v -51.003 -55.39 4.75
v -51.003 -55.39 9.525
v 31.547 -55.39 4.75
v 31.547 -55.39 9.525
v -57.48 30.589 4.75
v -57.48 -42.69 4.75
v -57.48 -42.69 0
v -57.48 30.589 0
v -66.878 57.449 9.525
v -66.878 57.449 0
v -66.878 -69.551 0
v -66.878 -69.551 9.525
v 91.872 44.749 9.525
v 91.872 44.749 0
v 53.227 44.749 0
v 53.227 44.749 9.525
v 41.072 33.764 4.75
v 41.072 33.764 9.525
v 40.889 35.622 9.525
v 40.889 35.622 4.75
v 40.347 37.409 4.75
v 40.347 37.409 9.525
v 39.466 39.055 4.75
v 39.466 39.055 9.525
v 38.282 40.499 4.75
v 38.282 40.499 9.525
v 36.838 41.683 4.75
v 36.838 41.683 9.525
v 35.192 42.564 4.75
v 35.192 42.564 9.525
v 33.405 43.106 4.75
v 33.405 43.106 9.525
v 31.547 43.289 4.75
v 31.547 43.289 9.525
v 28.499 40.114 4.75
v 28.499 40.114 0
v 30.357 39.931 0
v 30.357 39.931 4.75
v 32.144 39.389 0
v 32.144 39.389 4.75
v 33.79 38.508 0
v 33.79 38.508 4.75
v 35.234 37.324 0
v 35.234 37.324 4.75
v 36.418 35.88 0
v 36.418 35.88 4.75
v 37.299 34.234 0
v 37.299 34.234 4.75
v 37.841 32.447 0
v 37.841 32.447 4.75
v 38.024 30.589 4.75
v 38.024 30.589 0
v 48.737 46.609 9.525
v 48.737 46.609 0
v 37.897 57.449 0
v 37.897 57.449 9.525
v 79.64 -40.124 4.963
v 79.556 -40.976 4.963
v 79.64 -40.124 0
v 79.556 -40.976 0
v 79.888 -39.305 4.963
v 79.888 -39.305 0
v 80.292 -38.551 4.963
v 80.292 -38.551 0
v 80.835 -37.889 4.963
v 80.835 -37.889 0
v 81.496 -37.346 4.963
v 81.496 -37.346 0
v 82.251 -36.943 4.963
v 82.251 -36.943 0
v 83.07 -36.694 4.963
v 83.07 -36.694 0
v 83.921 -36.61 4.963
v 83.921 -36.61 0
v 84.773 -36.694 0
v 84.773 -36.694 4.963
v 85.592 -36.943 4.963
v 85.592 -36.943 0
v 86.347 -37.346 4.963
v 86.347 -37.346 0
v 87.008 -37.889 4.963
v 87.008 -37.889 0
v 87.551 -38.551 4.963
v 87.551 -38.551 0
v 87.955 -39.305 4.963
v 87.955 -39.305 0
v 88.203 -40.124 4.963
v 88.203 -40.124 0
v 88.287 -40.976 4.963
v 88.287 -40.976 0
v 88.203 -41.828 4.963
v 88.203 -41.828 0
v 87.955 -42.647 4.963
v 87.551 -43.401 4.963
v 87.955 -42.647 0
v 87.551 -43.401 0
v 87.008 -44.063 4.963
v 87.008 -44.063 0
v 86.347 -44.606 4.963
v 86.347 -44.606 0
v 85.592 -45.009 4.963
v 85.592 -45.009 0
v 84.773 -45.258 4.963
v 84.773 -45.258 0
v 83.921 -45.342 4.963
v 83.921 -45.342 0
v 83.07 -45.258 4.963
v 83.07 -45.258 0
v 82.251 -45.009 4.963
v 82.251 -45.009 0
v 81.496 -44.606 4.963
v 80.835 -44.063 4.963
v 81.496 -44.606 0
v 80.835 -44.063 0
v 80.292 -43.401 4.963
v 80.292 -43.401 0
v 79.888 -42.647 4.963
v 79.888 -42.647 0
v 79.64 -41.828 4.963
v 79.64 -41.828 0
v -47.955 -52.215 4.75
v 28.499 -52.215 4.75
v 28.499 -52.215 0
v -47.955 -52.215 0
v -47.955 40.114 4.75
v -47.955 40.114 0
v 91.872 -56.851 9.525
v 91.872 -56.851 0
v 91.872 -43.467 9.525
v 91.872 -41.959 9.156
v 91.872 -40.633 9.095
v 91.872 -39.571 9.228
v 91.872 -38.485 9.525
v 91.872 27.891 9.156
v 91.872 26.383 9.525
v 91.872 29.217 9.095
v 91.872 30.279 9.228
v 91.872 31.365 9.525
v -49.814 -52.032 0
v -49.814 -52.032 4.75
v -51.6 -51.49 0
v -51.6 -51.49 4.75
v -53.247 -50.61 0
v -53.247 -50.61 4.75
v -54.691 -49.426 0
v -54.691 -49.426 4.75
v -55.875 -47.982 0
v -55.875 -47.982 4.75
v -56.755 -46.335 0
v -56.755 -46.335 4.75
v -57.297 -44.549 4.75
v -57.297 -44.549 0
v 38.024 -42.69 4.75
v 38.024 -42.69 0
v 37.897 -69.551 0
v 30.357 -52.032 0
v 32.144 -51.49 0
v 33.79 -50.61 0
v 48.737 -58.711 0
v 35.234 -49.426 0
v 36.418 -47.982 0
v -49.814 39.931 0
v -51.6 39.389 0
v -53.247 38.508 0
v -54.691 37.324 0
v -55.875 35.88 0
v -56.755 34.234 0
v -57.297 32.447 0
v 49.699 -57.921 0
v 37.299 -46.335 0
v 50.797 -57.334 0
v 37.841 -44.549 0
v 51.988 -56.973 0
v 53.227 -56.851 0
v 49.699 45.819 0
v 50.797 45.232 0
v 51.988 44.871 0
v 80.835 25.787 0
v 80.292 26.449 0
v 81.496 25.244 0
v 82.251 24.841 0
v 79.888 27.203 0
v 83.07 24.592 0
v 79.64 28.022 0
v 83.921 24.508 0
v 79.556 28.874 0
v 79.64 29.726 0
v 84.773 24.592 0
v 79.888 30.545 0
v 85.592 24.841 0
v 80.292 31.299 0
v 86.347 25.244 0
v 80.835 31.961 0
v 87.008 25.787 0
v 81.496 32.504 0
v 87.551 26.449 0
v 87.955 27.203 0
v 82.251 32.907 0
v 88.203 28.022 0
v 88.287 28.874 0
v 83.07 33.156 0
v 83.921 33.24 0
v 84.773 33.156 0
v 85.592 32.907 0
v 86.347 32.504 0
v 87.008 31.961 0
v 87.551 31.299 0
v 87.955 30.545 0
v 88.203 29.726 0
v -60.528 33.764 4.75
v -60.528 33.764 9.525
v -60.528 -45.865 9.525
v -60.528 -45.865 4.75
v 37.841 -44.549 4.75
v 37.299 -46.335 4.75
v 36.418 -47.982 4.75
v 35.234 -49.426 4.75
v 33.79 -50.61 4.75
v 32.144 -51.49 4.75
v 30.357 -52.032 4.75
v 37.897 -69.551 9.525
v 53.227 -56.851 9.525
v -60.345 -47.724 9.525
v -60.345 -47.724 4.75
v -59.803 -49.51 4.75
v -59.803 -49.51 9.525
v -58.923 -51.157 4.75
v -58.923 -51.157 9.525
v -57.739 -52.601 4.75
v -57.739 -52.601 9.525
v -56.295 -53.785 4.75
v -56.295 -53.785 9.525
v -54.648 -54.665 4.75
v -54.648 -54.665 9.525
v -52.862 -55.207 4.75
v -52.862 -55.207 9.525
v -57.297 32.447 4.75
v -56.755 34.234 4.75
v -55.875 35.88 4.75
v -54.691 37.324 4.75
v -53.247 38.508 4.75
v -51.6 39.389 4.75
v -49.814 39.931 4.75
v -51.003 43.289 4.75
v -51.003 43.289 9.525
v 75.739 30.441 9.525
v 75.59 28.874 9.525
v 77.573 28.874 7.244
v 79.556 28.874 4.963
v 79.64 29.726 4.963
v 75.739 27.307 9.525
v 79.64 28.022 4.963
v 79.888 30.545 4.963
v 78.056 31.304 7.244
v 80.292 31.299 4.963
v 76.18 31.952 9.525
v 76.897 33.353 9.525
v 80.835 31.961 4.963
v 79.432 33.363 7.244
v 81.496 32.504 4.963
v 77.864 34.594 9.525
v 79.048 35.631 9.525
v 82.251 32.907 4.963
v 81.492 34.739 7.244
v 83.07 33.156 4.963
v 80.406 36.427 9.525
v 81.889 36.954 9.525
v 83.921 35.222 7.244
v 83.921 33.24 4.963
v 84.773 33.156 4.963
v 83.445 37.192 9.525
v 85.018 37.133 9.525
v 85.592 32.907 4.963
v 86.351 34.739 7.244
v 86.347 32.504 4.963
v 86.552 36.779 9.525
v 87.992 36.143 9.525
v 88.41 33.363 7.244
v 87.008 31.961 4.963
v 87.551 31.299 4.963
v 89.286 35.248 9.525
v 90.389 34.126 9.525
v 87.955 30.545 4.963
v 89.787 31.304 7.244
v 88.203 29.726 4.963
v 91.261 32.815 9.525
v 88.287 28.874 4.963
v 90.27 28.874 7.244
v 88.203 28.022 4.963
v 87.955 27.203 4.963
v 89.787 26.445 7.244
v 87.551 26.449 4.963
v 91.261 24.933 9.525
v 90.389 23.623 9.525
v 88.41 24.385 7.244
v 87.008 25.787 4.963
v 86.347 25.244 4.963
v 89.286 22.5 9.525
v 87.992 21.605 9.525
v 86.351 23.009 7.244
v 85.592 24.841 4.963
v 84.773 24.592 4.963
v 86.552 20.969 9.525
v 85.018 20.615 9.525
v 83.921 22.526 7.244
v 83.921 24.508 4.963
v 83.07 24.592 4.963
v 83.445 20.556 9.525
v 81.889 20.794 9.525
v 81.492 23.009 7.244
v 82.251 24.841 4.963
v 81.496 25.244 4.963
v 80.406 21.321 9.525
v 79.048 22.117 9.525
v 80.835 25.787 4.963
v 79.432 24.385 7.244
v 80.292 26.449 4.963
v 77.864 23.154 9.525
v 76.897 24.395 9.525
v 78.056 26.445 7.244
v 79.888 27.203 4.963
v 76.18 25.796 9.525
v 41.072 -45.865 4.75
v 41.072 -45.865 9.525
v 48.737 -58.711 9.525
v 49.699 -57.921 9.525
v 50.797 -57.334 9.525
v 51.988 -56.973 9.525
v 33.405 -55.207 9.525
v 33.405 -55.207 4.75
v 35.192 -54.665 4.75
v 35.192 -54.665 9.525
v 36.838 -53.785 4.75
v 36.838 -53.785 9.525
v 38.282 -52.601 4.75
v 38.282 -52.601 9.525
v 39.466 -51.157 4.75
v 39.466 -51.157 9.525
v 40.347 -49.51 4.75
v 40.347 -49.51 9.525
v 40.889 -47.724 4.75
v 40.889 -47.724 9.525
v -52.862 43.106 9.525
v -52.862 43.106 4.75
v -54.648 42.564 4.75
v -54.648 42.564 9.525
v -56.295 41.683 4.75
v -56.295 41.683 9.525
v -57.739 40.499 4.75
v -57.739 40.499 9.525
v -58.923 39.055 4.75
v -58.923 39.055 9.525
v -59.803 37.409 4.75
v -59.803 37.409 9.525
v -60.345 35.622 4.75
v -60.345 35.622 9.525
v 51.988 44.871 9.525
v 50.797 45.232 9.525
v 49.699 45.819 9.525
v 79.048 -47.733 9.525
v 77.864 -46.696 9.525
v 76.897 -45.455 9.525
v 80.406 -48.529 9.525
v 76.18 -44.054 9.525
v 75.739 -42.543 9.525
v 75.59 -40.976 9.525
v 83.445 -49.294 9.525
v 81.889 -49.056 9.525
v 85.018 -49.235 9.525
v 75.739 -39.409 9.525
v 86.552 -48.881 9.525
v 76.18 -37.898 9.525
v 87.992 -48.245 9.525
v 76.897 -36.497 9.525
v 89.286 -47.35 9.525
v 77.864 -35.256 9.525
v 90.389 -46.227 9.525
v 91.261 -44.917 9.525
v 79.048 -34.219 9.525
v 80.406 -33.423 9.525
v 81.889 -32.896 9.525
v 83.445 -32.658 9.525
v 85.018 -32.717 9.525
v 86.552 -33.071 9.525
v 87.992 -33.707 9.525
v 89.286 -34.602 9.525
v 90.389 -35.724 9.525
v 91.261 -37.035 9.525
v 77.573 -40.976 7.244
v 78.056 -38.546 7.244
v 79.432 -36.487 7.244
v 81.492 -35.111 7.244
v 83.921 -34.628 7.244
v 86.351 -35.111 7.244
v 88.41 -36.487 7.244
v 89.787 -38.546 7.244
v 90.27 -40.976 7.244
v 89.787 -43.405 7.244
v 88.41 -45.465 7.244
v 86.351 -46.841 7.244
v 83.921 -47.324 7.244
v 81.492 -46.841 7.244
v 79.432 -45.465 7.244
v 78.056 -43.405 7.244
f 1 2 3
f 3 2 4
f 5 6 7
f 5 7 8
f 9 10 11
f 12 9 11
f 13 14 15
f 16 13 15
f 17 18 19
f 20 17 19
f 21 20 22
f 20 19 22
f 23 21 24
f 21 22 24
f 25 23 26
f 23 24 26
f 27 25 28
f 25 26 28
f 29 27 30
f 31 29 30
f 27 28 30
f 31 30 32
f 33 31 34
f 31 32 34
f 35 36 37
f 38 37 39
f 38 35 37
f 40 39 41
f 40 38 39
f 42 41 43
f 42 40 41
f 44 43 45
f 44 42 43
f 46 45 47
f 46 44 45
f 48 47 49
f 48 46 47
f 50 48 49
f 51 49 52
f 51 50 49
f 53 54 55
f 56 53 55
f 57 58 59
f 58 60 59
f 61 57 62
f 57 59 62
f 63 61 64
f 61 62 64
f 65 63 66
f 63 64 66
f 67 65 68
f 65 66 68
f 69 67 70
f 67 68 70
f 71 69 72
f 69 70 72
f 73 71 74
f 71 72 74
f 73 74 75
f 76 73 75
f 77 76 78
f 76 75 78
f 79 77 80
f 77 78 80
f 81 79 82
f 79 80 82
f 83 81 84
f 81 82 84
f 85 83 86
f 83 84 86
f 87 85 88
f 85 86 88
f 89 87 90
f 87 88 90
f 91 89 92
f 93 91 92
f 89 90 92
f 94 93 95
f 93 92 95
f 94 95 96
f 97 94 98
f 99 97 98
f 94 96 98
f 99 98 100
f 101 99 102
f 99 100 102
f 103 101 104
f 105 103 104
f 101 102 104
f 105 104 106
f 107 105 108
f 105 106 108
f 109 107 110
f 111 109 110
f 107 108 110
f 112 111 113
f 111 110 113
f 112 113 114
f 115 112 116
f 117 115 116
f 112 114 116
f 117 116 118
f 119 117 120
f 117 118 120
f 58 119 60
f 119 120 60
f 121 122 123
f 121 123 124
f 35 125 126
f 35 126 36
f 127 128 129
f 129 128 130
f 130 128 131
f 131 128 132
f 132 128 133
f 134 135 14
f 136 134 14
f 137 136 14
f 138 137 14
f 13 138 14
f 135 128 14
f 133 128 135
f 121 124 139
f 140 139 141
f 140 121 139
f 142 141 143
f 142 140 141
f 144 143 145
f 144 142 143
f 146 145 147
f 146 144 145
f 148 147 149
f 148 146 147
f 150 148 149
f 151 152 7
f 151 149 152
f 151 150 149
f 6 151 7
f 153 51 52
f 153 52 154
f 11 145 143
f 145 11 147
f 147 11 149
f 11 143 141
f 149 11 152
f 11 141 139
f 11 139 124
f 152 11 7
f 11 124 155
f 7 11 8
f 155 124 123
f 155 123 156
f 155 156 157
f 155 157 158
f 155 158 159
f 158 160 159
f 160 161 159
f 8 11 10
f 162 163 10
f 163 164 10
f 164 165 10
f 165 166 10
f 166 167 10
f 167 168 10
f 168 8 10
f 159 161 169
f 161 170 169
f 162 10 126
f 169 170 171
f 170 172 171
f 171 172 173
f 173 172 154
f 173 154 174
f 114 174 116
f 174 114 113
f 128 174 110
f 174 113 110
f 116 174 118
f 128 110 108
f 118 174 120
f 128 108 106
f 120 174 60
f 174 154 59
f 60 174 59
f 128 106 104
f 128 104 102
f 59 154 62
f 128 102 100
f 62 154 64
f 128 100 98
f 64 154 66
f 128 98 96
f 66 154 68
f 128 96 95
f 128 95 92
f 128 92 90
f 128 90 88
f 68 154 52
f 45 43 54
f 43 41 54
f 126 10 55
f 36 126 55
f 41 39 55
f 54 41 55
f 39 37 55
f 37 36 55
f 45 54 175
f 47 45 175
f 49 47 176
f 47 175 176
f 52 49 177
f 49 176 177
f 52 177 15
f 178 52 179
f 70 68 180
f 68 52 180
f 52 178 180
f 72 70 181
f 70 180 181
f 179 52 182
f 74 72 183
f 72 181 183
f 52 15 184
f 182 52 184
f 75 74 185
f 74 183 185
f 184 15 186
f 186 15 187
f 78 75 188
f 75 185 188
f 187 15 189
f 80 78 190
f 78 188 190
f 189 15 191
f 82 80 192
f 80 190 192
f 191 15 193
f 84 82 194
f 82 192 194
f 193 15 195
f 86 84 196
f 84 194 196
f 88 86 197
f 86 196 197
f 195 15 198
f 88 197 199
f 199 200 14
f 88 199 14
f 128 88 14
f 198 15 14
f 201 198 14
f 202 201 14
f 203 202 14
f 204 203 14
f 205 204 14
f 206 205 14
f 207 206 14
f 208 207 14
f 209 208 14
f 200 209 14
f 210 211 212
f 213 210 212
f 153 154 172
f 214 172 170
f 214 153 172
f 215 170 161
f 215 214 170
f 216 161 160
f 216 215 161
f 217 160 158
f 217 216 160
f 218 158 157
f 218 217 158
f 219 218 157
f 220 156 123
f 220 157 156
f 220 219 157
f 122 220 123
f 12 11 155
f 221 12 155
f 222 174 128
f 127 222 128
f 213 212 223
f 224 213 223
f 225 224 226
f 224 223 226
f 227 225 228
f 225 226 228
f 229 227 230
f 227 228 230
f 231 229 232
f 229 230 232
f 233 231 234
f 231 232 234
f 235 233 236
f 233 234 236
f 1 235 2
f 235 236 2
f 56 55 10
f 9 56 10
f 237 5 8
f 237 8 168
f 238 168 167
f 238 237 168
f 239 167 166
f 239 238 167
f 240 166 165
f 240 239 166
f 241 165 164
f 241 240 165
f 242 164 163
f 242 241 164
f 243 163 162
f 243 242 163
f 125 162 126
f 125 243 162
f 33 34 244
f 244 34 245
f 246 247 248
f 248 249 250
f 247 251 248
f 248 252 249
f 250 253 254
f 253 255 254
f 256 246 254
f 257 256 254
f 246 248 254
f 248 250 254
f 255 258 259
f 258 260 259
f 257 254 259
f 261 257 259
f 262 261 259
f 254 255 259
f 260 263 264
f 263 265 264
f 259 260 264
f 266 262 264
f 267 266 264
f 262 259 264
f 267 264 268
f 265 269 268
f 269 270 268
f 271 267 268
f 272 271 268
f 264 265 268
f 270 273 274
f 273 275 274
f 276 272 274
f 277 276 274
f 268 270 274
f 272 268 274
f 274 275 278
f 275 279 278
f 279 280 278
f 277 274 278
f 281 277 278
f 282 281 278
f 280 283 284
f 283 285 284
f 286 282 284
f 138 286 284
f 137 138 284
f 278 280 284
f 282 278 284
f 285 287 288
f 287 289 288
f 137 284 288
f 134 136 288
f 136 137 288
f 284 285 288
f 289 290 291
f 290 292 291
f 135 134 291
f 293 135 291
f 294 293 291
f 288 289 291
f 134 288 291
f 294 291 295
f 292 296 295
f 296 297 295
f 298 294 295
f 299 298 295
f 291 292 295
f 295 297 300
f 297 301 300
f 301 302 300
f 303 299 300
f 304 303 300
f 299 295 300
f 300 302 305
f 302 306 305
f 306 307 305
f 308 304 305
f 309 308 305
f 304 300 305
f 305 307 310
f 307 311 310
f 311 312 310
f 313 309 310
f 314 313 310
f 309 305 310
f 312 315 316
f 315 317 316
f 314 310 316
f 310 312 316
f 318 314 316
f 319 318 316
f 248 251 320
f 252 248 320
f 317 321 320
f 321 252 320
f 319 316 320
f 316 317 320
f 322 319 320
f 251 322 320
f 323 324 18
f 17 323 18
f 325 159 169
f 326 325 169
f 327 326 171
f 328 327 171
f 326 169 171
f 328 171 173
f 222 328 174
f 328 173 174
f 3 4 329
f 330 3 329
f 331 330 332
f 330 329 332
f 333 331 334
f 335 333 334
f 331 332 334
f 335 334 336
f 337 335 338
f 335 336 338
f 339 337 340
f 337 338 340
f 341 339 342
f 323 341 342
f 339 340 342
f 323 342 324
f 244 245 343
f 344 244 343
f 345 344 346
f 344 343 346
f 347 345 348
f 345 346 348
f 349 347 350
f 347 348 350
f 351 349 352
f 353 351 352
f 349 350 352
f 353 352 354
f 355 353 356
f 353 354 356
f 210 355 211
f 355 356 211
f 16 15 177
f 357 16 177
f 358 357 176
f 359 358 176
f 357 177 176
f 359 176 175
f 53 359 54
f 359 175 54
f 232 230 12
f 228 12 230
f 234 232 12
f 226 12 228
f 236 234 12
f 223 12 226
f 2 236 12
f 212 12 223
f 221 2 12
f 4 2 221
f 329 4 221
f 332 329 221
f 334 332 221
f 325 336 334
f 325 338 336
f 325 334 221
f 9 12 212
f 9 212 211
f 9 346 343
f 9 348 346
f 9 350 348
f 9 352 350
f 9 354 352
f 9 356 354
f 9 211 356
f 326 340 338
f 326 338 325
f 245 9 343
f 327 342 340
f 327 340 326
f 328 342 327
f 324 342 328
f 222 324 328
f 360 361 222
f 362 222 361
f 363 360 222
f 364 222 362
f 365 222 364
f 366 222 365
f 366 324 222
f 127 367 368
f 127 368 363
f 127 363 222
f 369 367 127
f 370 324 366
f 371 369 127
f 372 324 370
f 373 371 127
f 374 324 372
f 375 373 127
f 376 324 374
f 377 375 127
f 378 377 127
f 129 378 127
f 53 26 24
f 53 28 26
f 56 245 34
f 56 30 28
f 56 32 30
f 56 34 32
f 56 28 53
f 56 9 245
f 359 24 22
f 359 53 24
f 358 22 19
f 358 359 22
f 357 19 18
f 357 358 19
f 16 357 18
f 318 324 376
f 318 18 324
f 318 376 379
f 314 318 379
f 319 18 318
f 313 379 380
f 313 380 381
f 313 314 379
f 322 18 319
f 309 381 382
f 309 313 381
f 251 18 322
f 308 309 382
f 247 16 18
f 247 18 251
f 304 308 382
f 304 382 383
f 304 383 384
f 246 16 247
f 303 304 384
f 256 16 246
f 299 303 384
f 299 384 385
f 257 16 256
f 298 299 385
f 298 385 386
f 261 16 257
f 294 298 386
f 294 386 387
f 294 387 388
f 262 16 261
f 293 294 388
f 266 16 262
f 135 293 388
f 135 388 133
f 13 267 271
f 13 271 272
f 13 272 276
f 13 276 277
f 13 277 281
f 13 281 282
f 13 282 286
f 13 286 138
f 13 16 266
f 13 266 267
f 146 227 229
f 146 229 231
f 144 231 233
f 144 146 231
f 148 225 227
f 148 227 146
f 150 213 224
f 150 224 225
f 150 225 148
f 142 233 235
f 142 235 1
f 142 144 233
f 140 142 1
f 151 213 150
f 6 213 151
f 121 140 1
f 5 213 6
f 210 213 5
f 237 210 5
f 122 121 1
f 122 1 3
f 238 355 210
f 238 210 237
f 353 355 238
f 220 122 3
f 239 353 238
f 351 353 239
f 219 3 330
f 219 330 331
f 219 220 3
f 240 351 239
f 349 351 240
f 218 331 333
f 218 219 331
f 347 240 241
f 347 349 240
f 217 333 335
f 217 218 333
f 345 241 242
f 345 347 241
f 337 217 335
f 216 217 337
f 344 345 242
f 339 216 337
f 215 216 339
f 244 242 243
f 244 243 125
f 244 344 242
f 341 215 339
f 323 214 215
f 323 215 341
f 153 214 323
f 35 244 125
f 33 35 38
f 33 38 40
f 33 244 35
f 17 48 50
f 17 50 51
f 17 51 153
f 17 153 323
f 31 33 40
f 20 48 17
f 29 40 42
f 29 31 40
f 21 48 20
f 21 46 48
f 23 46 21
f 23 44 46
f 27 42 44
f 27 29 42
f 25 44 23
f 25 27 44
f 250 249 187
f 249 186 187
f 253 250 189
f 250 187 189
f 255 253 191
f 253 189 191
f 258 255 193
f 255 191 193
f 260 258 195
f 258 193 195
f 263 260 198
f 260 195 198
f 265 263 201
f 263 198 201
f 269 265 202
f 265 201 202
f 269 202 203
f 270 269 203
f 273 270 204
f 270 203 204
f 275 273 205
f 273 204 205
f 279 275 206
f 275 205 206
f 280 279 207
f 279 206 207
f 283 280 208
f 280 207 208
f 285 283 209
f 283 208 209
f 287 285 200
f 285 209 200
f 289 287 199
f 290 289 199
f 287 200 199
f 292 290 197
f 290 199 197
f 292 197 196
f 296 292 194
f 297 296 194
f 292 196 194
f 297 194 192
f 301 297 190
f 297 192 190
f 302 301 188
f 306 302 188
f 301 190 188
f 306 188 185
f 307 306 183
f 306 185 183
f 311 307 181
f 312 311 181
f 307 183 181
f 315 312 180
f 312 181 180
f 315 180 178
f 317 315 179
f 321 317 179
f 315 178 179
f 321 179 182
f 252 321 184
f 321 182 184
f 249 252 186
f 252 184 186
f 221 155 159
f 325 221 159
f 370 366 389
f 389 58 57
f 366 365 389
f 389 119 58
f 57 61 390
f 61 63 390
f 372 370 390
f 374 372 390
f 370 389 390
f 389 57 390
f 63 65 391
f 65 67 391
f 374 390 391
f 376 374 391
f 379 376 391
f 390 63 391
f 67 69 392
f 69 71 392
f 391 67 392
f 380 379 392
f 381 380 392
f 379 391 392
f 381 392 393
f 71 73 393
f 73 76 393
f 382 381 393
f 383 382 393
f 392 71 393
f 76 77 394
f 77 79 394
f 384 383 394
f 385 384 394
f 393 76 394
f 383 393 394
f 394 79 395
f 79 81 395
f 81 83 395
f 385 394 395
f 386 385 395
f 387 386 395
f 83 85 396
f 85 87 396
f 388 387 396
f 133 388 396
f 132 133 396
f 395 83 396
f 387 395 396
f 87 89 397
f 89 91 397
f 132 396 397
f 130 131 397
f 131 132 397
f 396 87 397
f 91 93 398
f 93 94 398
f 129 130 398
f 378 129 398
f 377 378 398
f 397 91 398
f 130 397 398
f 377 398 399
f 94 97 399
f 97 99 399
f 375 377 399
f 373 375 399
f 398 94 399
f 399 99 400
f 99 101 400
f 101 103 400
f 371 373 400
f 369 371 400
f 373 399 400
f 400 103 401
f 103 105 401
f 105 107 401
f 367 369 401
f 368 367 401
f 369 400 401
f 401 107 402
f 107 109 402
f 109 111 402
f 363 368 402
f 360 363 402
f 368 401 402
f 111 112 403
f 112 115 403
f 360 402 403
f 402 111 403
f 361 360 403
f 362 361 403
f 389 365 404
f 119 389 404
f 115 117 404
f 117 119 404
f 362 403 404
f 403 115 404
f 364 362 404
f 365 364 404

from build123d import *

# Parameters (mm, degrees)
F1_DEPTH       = 9.525
F3_DEPTH       = 4.7752
F4_DEPTH       = 9.526
F6_D           = 8.73125
F6_CSINK_D     = 16.6624
F6_CSINK_ANGLE = 82


# Not quite as in the source:
# - a length typed as a fraction of an inch, garbled in the dataset ("3 / 203.2 mm" for 3/8 in), is restored


with BuildPart() as f1:
    # F0 (on Top) → F1 (new body)
    with BuildSketch(Plane.XY):
        with BuildLine():
            Line((37.8966893194, 57.4490684102), (-66.8783106806, 57.4490684102))
            Line((-66.8783106806, 57.4490684102), (-66.8783106806, -69.5509315898))
            Line((-66.8783106806, -69.5509315898), (37.8966893194, -69.5509315898))
            Line((37.8966893194, -69.5509315898), (48.7368173799, -58.7108035293))
            ThreePointArc((48.7368173799, -58.7108035293), (50.796905645, -57.3342965584), (53.2269454405, -56.8509315898))
            Line((53.2269454405, -56.8509315898), (91.8716893194, -56.8509315898))
            Line((91.8716893194, -56.8509315898), (91.8716893194, 44.7490684102))
            Line((91.8716893194, 44.7490684102), (53.2269454405, 44.7490684102))
            ThreePointArc((53.2269454405, 44.7490684102), (50.796905645, 45.2324333787), (48.7368173799, 46.6089403496))
            Line((48.7368173799, 46.6089403496), (37.8966893194, 57.4490684102))
        make_face()
    extrude(amount=F1_DEPTH)

    # F2 (on face) → F3 (cut)
    with BuildSketch(Plane.XY.offset(9.525)):
        with BuildLine():
            Line((31.5466893194, 43.2885684102), (-51.0033106806, 43.2885684102))
            ThreePointArc((-51.0033106806, 43.2885684102), (-57.7385027714, 40.498760501), (-60.5283106806, 33.7635684102))
            Line((-60.5283106806, 33.7635684102), (-60.5283106806, -45.8654315898))
            ThreePointArc((-60.5283106806, -45.8654315898), (-57.7385027714, -52.6006236806), (-51.0033106806, -55.3904315898))
            Line((-51.0033106806, -55.3904315898), (31.5466893194, -55.3904315898))
            ThreePointArc((31.5466893194, -55.3904315898), (38.2818814102, -52.6006236806), (41.0716893194, -45.8654315898))
            Line((41.0716893194, -45.8654315898), (41.0716893194, 33.7635684102))
            ThreePointArc((41.0716893194, 33.7635684102), (38.2818814102, 40.498760501), (31.5466893194, 43.2885684102))
        make_face()
        with BuildLine():
            ThreePointArc((-57.4803106806, 30.5885684102), (-54.6905027714, 37.323760501), (-47.9553106806, 40.1135684102))
            Line((-47.9553106806, 40.1135684102), (28.4986893194, 40.1135684102))
            ThreePointArc((28.4986893194, 40.1135684102), (35.2338814102, 37.323760501), (38.0236893194, 30.5885684102))
            Line((38.0236893194, 30.5885684102), (38.0236893194, -42.6904315898))
            ThreePointArc((38.0236893194, -42.6904315898), (35.2338814102, -49.4256236806), (28.4986893194, -52.2154315898))
            Line((28.4986893194, -52.2154315898), (-47.9553106806, -52.2154315898))
            ThreePointArc((-47.9553106806, -52.2154315898), (-54.6905027714, -49.4256236806), (-57.4803106806, -42.6904315898))
            Line((-57.4803106806, -42.6904315898), (-57.4803106806, 30.5885684102))
        make_face(mode=Mode.SUBTRACT)
    extrude(amount=-F3_DEPTH, mode=Mode.SUBTRACT)

    # F4 (cut, through all): a face of the model
    f4_faces = [f1.faces().sort_by_distance(p)[0] for p in [
        (-9.7283106806, -6.0509315898, 9.525),
    ]]
    extrude(f4_faces, amount=-F4_DEPTH, mode=Mode.SUBTRACT)

    # F6 (through all)
    with Locations(Plane.XY.offset(9.525)):
        with Locations((83.9214893194, 28.8740684102), (83.9214893194, -40.9759315898)):
            CounterSinkHole(F6_D / 2, F6_CSINK_D / 2, counter_sink_angle=F6_CSINK_ANGLE)


solid = f1.part
